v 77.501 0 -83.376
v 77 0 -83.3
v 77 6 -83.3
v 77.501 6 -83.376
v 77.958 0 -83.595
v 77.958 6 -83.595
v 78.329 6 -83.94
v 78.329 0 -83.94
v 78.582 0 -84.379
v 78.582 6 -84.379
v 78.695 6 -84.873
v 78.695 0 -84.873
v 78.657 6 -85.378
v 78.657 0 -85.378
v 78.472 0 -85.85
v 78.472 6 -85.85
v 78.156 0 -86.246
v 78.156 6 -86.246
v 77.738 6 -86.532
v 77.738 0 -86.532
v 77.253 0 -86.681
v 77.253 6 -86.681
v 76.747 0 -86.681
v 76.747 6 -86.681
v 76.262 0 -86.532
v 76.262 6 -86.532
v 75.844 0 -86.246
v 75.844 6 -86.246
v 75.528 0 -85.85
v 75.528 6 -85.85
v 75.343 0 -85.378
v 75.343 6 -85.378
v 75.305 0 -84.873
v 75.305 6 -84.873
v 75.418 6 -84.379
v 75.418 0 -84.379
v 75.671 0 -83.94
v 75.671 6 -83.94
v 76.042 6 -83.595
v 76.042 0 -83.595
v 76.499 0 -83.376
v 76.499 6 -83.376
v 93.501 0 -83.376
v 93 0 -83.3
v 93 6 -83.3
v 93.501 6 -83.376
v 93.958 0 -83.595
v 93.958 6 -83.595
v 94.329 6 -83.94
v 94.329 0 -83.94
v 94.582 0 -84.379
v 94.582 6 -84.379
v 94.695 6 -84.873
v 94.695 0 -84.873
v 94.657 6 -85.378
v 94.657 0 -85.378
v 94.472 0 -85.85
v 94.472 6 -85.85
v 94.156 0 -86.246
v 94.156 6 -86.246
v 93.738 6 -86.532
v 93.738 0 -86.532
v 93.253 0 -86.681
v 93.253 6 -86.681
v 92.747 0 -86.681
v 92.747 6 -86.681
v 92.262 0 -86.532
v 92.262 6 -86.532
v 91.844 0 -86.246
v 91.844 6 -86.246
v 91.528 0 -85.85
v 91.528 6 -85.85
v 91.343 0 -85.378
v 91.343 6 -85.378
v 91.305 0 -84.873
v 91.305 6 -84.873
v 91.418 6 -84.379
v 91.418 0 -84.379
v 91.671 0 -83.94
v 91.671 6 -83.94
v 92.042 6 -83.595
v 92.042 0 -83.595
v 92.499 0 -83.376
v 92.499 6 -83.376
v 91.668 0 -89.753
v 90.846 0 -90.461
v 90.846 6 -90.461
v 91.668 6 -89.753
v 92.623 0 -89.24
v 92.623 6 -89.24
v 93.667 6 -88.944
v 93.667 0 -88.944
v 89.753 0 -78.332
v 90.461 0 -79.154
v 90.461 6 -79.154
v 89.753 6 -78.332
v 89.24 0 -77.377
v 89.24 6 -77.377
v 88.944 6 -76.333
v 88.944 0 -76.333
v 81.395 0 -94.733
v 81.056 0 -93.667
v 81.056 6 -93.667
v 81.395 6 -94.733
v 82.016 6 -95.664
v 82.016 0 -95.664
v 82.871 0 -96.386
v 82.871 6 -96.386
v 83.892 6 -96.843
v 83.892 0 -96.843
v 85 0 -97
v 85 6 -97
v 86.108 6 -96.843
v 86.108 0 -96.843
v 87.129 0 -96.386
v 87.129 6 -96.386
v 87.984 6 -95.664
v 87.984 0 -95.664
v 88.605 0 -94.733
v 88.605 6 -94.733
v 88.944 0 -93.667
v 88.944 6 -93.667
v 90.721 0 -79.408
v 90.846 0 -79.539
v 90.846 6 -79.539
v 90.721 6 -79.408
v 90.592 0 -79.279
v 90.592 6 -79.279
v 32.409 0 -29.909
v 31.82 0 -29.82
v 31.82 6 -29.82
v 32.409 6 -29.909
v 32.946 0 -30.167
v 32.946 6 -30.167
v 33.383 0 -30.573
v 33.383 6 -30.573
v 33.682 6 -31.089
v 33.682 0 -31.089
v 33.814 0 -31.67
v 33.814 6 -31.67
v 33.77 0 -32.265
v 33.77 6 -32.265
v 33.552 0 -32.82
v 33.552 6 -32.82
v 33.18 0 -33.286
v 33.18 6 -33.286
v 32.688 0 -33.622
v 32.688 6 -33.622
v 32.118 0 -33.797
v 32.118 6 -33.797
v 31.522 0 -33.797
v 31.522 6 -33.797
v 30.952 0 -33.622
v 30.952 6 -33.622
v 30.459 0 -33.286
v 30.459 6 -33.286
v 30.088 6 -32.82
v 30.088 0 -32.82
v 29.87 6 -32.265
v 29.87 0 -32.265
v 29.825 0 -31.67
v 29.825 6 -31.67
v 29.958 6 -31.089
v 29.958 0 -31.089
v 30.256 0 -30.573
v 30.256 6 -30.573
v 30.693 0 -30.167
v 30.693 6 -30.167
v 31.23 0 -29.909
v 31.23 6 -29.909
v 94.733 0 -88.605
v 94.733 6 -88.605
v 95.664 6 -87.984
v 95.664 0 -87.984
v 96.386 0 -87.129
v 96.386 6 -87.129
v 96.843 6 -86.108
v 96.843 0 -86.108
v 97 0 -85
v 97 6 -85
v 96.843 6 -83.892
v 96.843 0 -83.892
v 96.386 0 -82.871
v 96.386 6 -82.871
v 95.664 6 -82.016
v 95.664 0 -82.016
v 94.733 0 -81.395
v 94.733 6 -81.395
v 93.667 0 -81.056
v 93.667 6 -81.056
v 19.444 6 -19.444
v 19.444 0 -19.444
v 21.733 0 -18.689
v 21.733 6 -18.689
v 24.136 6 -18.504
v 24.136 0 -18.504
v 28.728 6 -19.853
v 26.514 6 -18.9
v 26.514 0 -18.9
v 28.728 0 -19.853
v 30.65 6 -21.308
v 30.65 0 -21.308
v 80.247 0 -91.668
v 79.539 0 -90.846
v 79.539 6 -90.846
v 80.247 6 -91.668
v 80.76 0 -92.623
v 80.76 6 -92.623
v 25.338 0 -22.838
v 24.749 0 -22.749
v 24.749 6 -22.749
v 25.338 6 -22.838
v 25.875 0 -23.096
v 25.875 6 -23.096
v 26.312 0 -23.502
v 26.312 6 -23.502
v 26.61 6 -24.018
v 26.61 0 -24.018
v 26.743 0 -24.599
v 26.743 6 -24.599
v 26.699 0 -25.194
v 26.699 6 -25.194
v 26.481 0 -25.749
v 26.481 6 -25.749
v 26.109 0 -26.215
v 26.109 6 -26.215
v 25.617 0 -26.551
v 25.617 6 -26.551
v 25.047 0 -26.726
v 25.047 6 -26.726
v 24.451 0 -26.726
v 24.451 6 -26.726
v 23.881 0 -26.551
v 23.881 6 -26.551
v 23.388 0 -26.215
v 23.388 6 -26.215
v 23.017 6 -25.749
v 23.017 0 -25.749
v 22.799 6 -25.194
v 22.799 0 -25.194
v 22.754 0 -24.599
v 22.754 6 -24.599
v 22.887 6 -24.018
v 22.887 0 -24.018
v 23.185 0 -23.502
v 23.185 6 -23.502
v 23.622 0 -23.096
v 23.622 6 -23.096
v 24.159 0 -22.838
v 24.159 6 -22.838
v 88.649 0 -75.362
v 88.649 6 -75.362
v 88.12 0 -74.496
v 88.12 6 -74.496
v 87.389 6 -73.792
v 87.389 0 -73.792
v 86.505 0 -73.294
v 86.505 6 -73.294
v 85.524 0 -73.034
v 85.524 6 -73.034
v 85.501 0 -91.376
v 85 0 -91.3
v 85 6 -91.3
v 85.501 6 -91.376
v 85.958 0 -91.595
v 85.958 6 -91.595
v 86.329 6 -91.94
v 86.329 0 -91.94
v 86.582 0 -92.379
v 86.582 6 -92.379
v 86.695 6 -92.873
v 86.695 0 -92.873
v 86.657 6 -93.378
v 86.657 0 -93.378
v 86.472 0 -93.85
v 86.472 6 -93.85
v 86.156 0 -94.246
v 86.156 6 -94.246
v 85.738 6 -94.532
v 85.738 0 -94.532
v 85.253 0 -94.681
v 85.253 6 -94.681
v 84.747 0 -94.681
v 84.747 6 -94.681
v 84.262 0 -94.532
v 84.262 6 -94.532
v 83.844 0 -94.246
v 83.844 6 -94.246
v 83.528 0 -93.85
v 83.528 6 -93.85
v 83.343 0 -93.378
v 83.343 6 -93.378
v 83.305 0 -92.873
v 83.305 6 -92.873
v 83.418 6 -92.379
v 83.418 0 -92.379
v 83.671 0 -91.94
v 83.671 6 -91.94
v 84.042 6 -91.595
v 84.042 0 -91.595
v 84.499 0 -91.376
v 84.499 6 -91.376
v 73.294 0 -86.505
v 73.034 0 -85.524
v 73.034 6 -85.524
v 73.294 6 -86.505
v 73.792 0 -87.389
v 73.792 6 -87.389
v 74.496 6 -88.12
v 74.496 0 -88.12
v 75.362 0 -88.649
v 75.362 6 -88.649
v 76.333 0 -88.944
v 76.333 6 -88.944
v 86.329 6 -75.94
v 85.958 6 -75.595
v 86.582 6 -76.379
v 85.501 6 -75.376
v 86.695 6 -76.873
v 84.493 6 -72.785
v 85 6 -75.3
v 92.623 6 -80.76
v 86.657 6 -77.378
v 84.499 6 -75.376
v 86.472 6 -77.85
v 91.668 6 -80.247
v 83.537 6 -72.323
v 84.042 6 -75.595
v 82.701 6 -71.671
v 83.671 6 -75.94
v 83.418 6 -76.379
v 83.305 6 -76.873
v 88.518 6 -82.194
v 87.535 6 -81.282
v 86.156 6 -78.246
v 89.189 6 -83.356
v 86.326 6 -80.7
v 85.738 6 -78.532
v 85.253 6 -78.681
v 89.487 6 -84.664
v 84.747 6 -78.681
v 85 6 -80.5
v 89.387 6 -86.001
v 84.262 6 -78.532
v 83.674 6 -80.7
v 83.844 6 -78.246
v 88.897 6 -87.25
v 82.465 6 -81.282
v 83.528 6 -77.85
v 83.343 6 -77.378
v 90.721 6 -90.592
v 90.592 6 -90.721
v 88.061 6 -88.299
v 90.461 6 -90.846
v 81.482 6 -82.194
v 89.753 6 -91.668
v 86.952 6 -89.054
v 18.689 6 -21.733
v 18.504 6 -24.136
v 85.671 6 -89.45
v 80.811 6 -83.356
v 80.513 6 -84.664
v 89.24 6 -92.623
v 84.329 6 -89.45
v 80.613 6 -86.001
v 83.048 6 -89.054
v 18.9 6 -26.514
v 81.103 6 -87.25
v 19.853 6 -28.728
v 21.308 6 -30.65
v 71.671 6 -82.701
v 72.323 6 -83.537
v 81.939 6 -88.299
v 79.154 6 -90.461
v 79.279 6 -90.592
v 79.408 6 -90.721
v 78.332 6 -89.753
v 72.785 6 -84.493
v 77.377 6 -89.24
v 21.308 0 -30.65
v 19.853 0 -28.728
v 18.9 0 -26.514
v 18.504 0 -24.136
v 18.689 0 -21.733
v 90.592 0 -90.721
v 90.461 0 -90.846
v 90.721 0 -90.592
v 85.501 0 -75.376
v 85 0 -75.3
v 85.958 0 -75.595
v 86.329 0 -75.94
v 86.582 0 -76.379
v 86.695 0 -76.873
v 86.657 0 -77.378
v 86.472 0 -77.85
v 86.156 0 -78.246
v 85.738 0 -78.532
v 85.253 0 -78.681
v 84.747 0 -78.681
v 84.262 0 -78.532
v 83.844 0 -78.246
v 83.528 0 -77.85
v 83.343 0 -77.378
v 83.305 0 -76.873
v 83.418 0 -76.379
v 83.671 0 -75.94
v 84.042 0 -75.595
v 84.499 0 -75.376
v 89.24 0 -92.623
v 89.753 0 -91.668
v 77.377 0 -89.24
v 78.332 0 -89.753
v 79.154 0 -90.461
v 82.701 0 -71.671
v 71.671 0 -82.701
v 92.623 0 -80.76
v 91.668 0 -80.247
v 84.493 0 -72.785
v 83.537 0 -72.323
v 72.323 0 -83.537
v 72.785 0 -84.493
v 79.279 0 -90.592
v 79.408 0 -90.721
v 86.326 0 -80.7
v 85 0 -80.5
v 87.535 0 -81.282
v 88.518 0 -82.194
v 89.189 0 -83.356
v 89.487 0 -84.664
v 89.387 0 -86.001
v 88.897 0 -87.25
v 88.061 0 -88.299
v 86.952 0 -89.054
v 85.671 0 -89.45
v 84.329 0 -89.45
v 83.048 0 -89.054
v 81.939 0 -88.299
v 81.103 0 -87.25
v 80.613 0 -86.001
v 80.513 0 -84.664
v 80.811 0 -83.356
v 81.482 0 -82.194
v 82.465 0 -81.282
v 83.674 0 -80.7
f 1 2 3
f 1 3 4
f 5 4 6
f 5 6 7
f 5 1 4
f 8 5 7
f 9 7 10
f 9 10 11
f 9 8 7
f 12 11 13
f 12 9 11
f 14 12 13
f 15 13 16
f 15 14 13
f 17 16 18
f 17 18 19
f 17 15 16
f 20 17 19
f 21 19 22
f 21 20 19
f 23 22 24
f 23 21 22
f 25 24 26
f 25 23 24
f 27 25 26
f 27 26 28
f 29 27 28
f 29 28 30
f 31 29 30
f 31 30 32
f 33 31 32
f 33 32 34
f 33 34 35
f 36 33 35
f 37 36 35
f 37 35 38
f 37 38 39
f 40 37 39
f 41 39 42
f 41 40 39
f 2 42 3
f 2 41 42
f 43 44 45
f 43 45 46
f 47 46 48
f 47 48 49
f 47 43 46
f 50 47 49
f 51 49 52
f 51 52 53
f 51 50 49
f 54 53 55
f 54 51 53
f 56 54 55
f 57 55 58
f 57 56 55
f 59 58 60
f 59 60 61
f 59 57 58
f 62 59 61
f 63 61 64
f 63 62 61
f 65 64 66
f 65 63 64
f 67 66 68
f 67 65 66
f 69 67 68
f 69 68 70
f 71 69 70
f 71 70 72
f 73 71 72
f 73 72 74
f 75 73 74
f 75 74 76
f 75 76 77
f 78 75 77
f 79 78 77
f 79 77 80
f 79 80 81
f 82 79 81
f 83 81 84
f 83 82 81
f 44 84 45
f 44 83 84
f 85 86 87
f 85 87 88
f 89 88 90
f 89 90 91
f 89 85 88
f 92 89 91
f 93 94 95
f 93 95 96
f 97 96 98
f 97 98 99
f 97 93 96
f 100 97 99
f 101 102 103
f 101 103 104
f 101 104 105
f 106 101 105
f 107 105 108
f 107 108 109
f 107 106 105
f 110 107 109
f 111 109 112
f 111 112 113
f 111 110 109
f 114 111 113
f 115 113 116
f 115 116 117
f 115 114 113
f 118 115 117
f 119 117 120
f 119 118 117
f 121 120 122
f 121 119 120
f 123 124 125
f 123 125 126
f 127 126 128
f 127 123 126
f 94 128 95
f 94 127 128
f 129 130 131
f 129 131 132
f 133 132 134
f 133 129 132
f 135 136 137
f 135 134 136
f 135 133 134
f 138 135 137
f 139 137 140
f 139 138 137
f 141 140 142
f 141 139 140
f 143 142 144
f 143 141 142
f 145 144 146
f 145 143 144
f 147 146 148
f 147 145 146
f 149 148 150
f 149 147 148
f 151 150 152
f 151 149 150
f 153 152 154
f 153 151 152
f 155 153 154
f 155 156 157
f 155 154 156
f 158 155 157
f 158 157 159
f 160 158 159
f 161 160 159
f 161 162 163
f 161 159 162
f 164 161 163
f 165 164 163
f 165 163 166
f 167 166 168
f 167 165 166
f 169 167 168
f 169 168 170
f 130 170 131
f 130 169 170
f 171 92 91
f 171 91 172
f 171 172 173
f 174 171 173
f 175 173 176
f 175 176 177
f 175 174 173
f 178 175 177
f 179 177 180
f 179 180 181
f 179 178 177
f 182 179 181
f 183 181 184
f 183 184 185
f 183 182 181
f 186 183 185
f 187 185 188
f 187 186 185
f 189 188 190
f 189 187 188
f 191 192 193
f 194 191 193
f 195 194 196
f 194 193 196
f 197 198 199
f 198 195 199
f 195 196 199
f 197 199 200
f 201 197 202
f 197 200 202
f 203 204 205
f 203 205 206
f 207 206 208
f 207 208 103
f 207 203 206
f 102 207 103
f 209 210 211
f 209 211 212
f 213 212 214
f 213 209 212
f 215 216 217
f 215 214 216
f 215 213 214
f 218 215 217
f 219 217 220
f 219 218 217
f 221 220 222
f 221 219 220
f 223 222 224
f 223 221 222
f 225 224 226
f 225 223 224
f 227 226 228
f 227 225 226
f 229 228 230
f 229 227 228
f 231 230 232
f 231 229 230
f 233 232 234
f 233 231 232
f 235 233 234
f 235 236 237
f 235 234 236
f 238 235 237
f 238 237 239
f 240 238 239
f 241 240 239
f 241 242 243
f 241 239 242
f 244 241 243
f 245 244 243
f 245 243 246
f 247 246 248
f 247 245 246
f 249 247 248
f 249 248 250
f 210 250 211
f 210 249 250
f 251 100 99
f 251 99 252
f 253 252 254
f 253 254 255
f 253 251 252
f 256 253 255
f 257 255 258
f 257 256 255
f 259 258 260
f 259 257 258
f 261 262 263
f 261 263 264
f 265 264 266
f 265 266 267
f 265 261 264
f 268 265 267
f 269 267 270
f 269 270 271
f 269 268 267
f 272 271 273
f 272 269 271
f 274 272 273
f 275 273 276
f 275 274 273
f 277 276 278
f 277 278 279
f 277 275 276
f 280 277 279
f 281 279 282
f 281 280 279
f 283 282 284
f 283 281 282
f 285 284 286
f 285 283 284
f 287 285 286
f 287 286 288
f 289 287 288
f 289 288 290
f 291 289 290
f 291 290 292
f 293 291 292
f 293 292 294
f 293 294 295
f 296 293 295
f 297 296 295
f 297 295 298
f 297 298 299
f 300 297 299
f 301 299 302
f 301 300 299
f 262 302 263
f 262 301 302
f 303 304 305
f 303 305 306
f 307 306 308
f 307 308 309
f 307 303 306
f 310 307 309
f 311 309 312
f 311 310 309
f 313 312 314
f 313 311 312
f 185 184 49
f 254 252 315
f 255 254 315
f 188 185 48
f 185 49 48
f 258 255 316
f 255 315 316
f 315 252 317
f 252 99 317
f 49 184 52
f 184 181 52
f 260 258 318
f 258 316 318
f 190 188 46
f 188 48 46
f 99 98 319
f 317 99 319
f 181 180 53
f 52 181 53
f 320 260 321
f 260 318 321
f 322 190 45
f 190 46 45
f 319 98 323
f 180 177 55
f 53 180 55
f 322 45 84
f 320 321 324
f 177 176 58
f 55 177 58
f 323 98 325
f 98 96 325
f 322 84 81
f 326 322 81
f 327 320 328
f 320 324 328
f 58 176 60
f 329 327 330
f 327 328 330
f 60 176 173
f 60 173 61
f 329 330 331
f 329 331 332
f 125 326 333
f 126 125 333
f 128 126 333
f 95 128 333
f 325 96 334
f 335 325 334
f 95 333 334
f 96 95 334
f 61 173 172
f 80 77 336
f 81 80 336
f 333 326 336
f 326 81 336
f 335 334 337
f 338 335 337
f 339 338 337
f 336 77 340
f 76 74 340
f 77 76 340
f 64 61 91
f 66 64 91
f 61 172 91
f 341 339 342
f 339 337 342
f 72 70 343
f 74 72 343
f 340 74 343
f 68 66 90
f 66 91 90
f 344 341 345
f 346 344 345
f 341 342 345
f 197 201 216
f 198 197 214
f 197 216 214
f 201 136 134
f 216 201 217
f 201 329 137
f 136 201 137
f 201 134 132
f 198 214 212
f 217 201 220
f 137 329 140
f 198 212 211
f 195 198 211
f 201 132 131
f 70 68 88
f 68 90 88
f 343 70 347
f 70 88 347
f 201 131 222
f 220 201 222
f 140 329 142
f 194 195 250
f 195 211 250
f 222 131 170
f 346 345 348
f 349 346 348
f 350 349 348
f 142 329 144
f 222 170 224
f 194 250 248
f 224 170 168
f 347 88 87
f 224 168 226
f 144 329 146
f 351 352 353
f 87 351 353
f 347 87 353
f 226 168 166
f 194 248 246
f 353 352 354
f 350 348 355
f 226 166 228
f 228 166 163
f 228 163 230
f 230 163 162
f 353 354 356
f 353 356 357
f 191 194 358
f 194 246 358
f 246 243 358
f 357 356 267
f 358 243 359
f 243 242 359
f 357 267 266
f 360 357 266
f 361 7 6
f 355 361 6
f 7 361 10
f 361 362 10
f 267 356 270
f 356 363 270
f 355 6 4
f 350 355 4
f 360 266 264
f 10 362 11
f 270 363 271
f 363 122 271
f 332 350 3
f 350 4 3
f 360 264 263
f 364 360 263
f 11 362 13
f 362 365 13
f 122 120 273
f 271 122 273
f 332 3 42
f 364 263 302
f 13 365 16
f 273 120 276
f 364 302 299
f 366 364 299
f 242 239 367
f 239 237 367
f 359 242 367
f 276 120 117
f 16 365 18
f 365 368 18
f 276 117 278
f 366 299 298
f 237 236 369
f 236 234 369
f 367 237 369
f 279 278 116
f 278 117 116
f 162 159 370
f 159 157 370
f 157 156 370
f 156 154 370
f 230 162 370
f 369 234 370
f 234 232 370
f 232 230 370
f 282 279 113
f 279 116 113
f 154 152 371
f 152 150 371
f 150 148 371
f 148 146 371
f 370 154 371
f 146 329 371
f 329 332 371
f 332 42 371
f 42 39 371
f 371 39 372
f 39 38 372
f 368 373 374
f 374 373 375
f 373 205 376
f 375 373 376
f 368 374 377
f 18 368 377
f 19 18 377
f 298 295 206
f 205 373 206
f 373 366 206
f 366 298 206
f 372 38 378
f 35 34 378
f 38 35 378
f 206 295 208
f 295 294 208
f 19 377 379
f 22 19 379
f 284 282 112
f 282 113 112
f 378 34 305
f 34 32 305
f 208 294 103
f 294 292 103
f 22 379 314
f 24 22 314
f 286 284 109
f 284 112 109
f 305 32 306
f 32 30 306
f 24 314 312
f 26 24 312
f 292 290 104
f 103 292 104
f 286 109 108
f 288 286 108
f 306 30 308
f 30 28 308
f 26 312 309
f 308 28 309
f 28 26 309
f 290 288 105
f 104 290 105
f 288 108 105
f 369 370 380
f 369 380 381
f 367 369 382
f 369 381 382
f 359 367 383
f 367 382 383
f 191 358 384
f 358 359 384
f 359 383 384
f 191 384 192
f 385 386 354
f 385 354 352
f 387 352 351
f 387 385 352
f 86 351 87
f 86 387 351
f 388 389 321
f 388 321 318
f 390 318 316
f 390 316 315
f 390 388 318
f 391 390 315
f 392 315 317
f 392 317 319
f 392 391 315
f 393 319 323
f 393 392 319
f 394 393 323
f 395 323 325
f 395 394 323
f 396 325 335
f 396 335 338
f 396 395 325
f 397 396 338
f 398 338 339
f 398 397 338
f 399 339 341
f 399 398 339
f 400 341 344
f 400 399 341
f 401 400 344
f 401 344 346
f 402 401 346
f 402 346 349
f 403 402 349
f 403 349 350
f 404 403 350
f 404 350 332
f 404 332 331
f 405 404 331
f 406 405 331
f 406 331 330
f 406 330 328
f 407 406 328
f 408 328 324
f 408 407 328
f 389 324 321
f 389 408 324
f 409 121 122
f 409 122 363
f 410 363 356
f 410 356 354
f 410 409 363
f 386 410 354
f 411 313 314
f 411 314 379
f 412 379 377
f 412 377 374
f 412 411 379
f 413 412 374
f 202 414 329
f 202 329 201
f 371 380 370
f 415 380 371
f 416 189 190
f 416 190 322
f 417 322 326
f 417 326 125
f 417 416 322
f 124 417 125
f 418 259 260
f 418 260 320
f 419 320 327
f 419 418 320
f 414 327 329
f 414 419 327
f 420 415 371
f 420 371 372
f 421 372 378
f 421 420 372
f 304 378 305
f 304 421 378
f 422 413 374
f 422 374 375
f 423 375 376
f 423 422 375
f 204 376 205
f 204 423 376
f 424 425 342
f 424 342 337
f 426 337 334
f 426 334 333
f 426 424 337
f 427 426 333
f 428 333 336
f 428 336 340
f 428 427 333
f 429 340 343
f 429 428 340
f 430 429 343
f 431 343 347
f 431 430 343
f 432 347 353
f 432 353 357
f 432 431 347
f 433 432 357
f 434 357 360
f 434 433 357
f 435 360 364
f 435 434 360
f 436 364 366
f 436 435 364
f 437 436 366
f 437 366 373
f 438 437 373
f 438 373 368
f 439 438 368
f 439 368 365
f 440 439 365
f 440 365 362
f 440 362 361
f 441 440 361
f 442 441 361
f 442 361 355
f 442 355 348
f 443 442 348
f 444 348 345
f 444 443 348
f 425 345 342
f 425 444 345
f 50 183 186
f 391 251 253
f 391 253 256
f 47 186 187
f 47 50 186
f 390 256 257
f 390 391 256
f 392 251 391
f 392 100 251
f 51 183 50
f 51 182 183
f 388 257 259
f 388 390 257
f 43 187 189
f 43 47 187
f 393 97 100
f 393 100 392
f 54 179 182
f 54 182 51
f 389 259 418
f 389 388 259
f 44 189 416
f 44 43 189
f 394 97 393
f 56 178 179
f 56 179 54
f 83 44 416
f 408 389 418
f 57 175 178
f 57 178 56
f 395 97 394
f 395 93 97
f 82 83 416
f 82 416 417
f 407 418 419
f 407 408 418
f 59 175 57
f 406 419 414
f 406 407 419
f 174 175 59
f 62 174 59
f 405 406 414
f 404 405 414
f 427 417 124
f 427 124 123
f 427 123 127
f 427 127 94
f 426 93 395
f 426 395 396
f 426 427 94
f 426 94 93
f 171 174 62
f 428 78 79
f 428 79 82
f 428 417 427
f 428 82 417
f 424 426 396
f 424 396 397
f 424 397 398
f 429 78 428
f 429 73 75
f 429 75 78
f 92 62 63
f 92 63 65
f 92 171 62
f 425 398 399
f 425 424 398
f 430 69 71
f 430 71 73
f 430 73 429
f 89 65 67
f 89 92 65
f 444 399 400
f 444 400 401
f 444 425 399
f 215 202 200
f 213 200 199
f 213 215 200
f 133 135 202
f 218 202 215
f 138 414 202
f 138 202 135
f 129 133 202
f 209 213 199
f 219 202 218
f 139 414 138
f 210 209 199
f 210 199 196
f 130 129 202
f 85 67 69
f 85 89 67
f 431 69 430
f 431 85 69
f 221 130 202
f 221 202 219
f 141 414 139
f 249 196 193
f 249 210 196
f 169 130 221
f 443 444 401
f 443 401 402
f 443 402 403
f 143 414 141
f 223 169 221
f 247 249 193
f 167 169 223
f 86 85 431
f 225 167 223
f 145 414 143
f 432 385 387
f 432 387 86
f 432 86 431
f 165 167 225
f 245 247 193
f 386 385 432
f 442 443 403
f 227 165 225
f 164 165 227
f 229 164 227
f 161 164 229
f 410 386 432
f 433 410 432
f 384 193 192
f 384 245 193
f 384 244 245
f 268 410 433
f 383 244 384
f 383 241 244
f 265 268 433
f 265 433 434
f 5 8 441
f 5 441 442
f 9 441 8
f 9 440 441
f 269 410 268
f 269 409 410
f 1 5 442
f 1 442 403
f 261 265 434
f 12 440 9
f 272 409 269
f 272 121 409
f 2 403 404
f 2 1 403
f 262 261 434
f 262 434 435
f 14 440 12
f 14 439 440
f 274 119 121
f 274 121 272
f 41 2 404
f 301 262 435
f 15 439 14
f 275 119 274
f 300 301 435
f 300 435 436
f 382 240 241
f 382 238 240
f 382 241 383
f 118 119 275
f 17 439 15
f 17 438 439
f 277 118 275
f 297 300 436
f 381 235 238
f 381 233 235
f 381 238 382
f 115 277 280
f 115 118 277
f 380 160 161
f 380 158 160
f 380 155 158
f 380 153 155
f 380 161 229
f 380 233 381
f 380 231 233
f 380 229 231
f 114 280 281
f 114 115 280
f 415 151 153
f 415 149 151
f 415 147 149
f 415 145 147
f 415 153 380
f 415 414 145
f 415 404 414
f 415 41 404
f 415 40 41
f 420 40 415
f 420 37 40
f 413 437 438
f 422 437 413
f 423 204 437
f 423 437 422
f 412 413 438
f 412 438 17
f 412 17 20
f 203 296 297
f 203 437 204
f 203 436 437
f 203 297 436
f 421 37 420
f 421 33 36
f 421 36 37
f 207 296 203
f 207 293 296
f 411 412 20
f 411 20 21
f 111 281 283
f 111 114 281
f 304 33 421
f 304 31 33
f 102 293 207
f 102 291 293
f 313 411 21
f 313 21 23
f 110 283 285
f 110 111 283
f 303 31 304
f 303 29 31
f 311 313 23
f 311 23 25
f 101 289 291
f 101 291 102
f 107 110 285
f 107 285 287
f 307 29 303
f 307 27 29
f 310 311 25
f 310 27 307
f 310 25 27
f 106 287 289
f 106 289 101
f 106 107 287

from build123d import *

# Parameters (mm, degrees)
SKETCH2_R               = 1.7
SKETCH2_R_2             = 4.5
BOSS_EXTRUDE1_DEPTH     = 6
FILLET1_R               = 10
CUT_EXTRUDE2_DEPTH      = 138.309868546
CUT_EXTRUDE2_DEPTH_BACK = 138.309868546
SKETCH7_R               = 2


with BuildPart() as part:
    # Sketch2 → Boss-Extrude1 (new body)
    with BuildSketch(Plane(origin=(0, 0, 0), x_dir=(1, 0, 0), z_dir=(0, 1, 0))):
        with BuildLine():
            Line((82.701229094, 71.670763572), (23.580603164, 14.468001358))
            Line((23.580603164, 14.468001358), (14.468001358, 23.580603164))
            Line((14.468001358, 23.580603164), (71.670763572, 82.701229094))
            ThreePointArc((71.670763572, 82.701229094), (72.579468699, 84.002771186), (73.034411761, 85.523555075))
            ThreePointArc((73.034411761, 85.523555075), (74.120868496, 87.776797037), (76.333333333, 88.944053189))
            ThreePointArc((76.333333333, 88.944053189), (77.868327334, 89.470595445), (79.153846154, 90.460996723))
            ThreePointArc((79.153846154, 90.460996723), (79.343145751, 90.656854249), (79.539003277, 90.846153846))
            ThreePointArc((79.539003277, 90.846153846), (80.529404555, 92.131672666), (81.055946811, 93.666666667))
            ThreePointArc((81.055946811, 93.666666667), (85, 97), (88.944053189, 93.666666667))
            ThreePointArc((88.944053189, 93.666666667), (89.470595445, 92.131672666), (90.460996723, 90.846153846))
            ThreePointArc((90.460996723, 90.846153846), (90.656854249, 90.656854249), (90.846153846, 90.460996723))
            ThreePointArc((90.846153846, 90.460996723), (92.131672666, 89.470595445), (93.666666667, 88.944053189))
            ThreePointArc((93.666666667, 88.944053189), (97, 85), (93.666666667, 81.055946811))
            ThreePointArc((93.666666667, 81.055946811), (92.131672666, 80.529404555), (90.846153846, 79.539003277))
            ThreePointArc((90.846153846, 79.539003277), (90.656854249, 79.343145751), (90.460996723, 79.153846154))
            ThreePointArc((90.460996723, 79.153846154), (89.470595445, 77.868327334), (88.944053189, 76.333333333))
            ThreePointArc((88.944053189, 76.333333333), (87.776797037, 74.120868496), (85.523555075, 73.034411761))
            ThreePointArc((85.523555075, 73.034411761), (84.002771186, 72.579468699), (82.701229094, 71.670763572))
        make_face()
        with Locations(Location((85, 93, 0), (0, 0, 270))):
            Circle(SKETCH2_R, mode=Mode.SUBTRACT)
        with Locations(Location((93, 85, 0), (0, 0, 270))):
            Circle(SKETCH2_R, mode=Mode.SUBTRACT)
        with Locations(Location((85, 77, 0), (0, 0, 270))):
            Circle(SKETCH2_R, mode=Mode.SUBTRACT)
        with Locations(Location((77, 85, 0), (0, 0, 270))):
            Circle(SKETCH2_R, mode=Mode.SUBTRACT)
        with Locations(Location((85, 85, 0), (0, 0, 270))):
            Circle(SKETCH2_R_2, mode=Mode.SUBTRACT)
    extrude(amount=BOSS_EXTRUDE1_DEPTH)

    # Fillet1
    # the kernel refuses this fillet: 10 mm, written as the material it takes off along each edge
    with BuildSketch(Plane(origin=(23.580603164, -24.591214075, -14.468001358), x_dir=(0.71866742198992, 0, -0.6953539649490483), z_dir=(0, 1, 0)), Plane(origin=(14.468001358, -24.591214075, -23.580603164), x_dir=(0.7071067811865477, 0, 0.7071067811865475), z_dir=(0, 1, 0))) as fillet1_piece_1:
        with BuildLine():
            CenterArc((FILLET1_R * 0.983648563013, FILLET1_R), FILLET1_R, 180.944569645, 89.055430355)
            Line((-FILLET1_R * 0.0162155484343, FILLET1_R * 0.983514896433), (0, 0))
            Line((0, 0), (FILLET1_R * 0.983648563013, 0))
        make_face()
    extrude(amount=55.182428151, mode=Mode.SUBTRACT)

    # Sketch7 → Cut-Extrude2 (cut, two sides: drawn at the far end of the back side and taken through both)
    with BuildSketch(Plane(origin=(0, 0, 0), x_dir=(1, 0, 0), z_dir=(0, 1, 0)).offset(-CUT_EXTRUDE2_DEPTH_BACK)):
        with Locations(Location((24.748737342, 24.748737342, 0), (0, 0, 270))):
            Circle(SKETCH7_R)
        with Locations(Location((31.819805153, 31.819805153, 0), (0, 0, 270))):
            Circle(SKETCH7_R)
    extrude(amount=CUT_EXTRUDE2_DEPTH + CUT_EXTRUDE2_DEPTH_BACK, mode=Mode.SUBTRACT)


solid = part.part
